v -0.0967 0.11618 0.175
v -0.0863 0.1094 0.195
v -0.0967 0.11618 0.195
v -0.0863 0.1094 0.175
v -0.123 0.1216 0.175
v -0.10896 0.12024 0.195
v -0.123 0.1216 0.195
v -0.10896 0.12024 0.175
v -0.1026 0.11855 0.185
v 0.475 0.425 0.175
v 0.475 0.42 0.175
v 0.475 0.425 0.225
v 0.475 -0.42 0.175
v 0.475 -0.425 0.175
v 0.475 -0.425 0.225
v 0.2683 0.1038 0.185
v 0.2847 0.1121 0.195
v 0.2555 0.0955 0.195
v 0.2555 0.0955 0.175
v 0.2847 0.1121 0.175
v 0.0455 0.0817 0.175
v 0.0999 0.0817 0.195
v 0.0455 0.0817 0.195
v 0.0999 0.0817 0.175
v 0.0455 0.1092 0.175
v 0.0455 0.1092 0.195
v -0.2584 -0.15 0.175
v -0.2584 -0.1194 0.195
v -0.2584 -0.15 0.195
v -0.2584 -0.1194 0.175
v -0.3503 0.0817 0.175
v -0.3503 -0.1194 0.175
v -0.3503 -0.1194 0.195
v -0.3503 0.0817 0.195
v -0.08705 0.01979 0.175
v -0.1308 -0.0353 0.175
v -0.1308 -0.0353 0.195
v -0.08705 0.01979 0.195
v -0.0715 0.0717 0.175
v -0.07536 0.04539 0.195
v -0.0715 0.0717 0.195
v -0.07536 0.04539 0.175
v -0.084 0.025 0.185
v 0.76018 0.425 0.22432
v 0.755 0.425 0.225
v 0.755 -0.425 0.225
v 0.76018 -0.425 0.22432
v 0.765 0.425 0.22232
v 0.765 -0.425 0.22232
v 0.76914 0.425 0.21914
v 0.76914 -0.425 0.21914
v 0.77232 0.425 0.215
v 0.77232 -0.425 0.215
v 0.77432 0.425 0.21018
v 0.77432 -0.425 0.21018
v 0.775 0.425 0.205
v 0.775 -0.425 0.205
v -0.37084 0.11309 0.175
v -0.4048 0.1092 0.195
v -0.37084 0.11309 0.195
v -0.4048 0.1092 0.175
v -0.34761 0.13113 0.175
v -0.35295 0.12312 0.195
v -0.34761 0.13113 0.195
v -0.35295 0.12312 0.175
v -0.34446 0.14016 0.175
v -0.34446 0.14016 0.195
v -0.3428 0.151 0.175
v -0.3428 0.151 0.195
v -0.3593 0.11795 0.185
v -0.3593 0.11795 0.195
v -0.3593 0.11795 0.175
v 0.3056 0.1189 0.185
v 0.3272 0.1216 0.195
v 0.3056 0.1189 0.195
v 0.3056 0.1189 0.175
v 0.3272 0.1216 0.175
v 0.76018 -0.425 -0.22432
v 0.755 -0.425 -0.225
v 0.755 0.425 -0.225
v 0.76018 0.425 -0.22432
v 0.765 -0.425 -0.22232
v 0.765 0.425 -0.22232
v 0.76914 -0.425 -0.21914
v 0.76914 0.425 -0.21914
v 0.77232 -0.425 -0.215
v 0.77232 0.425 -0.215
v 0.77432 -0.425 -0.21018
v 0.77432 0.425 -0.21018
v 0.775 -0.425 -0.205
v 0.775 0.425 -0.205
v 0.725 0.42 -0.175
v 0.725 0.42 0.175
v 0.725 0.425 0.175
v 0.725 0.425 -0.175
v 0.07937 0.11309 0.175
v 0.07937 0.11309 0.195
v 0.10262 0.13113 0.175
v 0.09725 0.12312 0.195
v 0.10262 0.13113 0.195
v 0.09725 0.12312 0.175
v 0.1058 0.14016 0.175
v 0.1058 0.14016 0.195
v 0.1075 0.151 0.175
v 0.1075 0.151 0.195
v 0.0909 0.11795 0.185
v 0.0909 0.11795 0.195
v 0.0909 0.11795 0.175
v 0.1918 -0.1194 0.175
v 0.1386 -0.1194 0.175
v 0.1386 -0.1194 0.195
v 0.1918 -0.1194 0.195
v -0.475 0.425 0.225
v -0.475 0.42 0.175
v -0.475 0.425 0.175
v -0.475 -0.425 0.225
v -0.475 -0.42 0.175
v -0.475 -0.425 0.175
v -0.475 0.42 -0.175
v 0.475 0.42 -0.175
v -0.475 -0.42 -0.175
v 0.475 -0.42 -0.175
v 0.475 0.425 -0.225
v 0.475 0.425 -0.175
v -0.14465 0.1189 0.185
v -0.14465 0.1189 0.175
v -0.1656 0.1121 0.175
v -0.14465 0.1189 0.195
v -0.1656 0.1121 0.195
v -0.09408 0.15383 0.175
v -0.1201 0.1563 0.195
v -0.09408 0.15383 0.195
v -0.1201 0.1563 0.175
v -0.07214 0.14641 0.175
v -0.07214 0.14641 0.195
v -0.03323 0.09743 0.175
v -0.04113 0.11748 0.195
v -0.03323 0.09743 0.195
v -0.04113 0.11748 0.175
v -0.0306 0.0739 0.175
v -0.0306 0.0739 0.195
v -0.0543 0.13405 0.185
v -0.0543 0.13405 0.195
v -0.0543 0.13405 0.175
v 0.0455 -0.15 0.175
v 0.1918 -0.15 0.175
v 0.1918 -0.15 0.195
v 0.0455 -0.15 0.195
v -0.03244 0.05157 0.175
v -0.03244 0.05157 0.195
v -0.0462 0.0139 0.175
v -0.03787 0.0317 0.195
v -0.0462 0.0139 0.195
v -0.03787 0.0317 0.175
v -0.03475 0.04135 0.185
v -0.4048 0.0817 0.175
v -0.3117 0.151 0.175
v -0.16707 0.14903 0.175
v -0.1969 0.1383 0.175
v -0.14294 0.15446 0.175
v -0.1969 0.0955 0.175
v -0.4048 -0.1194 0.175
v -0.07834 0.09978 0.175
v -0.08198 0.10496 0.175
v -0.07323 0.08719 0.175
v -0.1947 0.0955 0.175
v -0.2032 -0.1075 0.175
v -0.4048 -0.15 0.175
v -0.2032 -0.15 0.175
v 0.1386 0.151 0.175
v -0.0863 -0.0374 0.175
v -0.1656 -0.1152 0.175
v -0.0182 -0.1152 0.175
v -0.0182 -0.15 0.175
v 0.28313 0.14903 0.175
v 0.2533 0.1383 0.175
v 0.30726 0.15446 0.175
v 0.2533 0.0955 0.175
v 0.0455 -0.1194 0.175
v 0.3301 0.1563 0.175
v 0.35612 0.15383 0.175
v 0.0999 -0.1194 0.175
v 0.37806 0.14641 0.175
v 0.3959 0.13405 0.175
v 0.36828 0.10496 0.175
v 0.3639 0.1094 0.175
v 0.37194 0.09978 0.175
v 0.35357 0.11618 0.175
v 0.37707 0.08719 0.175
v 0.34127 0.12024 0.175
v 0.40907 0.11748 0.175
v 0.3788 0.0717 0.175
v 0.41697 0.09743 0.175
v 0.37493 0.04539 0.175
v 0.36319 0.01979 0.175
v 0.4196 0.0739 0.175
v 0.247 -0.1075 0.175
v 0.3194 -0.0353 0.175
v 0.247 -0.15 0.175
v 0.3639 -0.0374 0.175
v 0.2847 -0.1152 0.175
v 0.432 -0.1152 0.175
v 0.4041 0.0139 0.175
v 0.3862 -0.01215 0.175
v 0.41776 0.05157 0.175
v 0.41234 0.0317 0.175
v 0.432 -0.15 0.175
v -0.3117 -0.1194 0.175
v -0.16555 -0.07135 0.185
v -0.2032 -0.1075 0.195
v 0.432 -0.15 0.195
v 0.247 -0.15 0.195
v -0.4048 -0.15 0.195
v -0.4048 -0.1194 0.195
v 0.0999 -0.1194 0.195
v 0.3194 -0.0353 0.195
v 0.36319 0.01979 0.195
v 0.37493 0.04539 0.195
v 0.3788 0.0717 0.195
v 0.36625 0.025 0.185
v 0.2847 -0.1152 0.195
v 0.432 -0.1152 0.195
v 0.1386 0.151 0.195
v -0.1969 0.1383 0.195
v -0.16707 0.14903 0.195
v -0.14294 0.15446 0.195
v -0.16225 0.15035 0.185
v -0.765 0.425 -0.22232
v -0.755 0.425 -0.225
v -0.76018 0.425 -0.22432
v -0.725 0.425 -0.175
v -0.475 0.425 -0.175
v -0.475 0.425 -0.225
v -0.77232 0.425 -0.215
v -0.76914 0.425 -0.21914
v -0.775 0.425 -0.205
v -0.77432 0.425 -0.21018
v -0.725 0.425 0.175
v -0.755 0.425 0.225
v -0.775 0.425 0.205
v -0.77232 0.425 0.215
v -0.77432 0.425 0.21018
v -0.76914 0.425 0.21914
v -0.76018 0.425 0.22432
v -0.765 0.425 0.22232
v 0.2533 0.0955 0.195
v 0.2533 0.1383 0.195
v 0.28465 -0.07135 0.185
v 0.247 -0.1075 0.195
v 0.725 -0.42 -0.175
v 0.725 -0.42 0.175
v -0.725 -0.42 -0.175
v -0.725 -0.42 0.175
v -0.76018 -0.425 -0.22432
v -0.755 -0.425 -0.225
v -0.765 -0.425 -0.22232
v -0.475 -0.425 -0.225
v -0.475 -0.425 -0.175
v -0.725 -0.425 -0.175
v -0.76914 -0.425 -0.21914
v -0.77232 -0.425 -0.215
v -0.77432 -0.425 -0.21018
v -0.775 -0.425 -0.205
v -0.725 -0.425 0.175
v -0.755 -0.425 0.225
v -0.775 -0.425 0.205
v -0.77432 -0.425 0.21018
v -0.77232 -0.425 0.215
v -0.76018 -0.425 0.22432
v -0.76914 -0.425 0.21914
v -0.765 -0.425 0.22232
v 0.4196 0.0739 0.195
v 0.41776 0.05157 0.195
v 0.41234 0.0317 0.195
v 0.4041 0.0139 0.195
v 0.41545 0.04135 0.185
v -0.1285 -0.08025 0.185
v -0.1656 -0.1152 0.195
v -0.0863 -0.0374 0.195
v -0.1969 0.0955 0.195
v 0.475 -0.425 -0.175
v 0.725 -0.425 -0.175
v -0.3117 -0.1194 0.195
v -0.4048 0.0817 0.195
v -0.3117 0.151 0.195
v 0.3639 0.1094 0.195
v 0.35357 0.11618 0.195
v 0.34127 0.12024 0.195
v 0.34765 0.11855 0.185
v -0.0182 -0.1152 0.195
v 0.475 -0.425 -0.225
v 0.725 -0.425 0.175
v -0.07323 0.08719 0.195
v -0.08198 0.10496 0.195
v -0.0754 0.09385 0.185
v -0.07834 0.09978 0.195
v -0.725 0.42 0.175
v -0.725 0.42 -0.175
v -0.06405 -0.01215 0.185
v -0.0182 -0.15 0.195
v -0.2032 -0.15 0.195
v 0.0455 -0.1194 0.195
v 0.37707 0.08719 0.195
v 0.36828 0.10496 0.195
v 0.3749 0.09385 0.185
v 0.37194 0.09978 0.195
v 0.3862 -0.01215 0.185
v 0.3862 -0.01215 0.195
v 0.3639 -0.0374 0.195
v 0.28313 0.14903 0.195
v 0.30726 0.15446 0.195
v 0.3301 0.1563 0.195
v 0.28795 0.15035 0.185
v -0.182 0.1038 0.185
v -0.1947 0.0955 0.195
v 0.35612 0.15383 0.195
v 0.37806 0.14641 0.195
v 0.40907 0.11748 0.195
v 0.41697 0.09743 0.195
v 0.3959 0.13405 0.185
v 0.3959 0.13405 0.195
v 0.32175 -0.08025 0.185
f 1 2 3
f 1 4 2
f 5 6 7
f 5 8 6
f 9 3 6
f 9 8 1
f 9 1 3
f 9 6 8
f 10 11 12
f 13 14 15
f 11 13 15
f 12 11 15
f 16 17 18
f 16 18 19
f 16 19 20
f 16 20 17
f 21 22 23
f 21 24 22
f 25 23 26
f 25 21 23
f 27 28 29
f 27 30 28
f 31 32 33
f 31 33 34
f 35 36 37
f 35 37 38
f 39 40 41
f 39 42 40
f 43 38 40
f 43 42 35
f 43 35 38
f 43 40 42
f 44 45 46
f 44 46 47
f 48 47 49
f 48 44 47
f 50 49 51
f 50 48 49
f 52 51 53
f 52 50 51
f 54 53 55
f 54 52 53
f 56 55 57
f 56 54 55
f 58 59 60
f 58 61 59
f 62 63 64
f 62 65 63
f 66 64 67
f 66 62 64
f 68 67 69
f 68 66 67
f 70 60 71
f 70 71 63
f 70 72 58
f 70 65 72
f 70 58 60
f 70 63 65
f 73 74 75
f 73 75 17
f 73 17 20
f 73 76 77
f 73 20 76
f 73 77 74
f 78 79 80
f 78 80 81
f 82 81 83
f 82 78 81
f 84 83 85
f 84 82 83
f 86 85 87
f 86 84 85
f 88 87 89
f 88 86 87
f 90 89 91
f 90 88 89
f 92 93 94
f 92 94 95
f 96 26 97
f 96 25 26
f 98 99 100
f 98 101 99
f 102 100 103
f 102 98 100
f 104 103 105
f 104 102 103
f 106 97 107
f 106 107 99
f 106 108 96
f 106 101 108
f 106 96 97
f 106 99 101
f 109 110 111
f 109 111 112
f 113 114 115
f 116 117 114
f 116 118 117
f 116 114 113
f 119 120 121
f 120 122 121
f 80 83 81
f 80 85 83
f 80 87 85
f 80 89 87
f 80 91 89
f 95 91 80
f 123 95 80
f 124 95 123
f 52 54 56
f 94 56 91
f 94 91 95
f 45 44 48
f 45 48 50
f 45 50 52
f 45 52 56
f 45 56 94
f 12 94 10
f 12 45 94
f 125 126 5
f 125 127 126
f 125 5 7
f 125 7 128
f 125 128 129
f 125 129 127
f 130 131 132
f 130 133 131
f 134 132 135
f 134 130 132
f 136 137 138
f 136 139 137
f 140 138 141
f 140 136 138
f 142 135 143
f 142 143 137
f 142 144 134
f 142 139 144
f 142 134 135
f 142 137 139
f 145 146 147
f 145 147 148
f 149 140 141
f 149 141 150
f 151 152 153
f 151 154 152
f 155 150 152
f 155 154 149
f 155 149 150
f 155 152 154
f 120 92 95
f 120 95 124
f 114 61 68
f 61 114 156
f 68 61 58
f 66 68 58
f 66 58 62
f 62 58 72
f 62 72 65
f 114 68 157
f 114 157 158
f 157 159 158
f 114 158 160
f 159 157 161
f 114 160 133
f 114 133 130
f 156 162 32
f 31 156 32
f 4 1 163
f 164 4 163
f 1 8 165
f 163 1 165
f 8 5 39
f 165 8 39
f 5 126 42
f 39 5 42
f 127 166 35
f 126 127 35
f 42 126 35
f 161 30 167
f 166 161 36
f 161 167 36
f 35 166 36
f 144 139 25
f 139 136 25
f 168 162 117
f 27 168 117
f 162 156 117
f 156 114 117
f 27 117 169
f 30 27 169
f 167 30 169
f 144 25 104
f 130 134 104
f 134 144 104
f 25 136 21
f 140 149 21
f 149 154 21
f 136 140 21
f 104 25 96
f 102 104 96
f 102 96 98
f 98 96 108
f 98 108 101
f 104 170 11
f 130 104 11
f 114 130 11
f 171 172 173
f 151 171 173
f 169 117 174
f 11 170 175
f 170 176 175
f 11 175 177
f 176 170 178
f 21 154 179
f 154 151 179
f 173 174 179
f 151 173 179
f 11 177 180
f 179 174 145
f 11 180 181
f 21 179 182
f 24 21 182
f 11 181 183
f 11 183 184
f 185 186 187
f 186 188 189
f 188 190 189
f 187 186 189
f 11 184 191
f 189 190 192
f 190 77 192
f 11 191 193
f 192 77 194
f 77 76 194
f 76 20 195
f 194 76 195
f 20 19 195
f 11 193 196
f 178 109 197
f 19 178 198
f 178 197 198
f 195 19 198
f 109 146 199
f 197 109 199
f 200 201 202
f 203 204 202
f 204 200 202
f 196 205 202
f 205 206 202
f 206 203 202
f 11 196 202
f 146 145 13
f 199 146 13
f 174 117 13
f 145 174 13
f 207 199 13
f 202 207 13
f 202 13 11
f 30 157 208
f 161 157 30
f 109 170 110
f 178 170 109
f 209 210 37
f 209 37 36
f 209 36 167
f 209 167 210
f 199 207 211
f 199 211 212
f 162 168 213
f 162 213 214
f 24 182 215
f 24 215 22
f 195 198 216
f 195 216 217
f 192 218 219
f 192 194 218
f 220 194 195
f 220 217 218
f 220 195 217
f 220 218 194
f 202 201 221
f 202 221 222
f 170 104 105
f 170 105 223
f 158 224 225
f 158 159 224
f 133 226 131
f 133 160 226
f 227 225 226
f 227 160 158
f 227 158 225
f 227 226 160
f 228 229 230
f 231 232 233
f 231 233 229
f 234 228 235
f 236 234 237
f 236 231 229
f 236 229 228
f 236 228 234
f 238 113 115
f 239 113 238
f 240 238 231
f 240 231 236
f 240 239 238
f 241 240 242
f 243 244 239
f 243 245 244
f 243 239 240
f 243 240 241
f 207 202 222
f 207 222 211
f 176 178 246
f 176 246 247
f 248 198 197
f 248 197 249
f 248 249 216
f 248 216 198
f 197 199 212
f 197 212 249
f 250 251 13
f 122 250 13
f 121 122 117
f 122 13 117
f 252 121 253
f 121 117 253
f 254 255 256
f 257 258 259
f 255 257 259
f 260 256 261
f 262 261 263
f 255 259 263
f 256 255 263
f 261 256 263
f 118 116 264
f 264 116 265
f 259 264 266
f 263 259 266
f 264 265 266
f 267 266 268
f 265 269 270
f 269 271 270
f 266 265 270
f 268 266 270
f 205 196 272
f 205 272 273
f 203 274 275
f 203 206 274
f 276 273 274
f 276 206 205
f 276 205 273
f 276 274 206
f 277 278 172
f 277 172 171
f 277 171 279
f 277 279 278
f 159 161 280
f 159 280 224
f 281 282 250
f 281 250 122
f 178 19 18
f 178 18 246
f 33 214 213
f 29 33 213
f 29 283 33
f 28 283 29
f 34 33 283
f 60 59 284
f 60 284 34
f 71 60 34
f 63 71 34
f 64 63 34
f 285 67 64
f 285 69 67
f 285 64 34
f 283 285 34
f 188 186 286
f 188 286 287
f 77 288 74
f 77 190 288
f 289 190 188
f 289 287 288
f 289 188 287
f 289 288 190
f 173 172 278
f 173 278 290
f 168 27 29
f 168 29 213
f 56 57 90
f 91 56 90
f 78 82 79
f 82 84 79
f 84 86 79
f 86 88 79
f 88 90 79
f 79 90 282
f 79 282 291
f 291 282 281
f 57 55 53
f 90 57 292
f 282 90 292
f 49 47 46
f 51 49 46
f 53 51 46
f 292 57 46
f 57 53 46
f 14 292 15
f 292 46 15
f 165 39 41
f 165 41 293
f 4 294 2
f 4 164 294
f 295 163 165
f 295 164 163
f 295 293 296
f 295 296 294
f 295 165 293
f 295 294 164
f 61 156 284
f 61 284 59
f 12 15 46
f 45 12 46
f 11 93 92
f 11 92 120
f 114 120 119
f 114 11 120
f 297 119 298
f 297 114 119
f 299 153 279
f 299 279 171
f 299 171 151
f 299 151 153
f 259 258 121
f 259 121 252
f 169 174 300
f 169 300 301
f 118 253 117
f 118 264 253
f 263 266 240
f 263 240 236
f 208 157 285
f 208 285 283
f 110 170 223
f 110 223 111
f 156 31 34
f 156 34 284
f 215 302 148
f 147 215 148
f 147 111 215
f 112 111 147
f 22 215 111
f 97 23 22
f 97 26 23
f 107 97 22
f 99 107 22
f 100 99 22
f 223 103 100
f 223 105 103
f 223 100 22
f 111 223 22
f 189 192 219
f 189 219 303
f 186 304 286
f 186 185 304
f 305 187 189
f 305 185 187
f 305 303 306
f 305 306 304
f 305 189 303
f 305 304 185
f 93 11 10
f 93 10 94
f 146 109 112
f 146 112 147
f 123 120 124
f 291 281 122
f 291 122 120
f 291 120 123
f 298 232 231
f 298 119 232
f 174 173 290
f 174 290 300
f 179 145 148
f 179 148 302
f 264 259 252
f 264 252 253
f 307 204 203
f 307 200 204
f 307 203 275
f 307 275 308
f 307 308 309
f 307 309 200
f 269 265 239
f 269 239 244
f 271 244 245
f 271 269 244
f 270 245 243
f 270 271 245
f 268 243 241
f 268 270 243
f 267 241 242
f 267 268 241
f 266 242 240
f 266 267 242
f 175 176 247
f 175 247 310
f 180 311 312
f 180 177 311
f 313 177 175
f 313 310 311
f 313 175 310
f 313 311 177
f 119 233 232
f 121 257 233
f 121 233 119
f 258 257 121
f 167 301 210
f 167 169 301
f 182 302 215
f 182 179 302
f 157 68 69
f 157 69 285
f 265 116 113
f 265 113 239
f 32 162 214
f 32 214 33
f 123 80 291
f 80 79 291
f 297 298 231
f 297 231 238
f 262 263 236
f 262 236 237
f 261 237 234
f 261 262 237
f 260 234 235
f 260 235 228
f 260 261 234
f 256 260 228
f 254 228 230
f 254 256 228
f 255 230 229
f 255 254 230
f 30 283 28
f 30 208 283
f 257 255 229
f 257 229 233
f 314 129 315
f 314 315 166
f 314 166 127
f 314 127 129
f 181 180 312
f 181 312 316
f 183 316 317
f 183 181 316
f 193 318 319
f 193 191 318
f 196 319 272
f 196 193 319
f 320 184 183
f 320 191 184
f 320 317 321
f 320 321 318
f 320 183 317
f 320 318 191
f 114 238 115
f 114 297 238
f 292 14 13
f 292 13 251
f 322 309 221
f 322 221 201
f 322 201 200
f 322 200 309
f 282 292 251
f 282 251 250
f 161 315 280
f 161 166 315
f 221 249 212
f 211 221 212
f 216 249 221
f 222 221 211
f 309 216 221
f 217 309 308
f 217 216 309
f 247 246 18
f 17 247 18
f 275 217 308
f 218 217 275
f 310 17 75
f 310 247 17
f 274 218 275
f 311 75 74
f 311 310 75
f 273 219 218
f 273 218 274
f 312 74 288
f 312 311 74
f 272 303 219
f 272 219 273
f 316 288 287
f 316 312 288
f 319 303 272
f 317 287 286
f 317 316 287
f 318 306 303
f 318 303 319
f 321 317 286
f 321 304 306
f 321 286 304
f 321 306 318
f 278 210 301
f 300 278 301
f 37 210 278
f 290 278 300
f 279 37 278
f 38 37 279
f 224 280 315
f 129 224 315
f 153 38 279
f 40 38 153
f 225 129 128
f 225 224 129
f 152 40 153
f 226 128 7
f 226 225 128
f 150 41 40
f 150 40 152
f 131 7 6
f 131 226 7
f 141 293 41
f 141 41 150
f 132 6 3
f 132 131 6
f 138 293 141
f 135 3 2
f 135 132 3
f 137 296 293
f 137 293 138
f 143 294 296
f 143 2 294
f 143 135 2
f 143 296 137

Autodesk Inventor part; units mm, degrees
ref_plane "YZ Plane" through (0, 0, 0) normal (1, 0, 0) x (0, 1, 0)
ref_plane "XZ Plane" through (0, 0, 0) normal (0, 1, 0) x (-1, 0, 0)
ref_plane "XY Plane" through (0, 0, 0) normal (0, 0, 1) x (1, 0, 0)
sketch "Sketch1" plane through (0, 0, 0) normal (0, 1, 0) x (-1, 0, 0)
  line L0 (0.725, 0.175) -> (-0.725, 0.175)
  line L1 (-0.725, 0.175) -> (-0.725, -0.175)
  line L2 (-0.725, -0.175) -> (0.725, -0.175)
  line L3 (0.725, -0.175) -> (0.725, 0.175)
  line L4 (0.475, 0.175) -> (0.475, 0.225)
  line L5 (0.475, 0.225) -> (0.775, 0.225)
  line L6 (0.775, 0.225) -> (0.775, -0.225)
  line L7 (0.775, -0.225) -> (0.475, -0.225)
  line L8 (0.475, -0.225) -> (0.475, -0.175)
  line L9 (-0.475, 0.175) -> (-0.475, 0.225)
  line L10 (-0.475, 0.225) -> (-0.775, 0.225)
  line L11 (-0.775, 0.225) -> (-0.775, -0.225)
  line L12 (-0.775, -0.225) -> (-0.475, -0.225)
  line L13 (-0.475, -0.175) -> (-0.475, -0.225)
  line L14 (0.475, 0.175) -> (-0.475, 0.175)
  point P0 (0, 0)
  point P1 (0, 0.175)
  point P2 (0.725, 0)
  dimension "d0" = 1.55
  dimension "d1" = 0.05
  dimension "d2" = 0.05
  dimension "d3" = 0.45
  dimension "d4" = 0.3
extrude "Extrusion1" add sketch "Sketch1" along normal mid plane 0.85 contours L0 L4 L5 L6 L7 L8 L2 L3 | L0 L1 L2 L13 L12 L11 L10 L9
extrude "Extrusion2" add sketch "Sketch1" along normal mid plane 0.84 contours L3 L2 L1 L0
sketch "Sketch2" plane through (-0.475, -0.42, 0.175) normal (0, 0, 1) x (1, 0, 0)
  line L0 (0, 0) -> (0, 0.84) projected
  line L1 (0.95, 0) -> (0, 0) projected
  line L2 (0.95, 0) -> (0.95, 0.84) projected
  line L3 (0, 0.84) -> (0.95, 0.84) projected
  line L4 (0, 0.42) -> (0.95, 0.42) construction
  line L5 (0.2166, 0.27) -> (0.0702, 0.27)
  line L6 (0.0702, 0.27) -> (0.0702, 0.3006)
  line L7 (0.0702, 0.3006) -> (0.1247, 0.3006)
  line L8 (0.1247, 0.3006) -> (0.1247, 0.5017)
  line L9 (0.1247, 0.5017) -> (0.0702, 0.5017)
  line L10 (0.0702, 0.5017) -> (0.0702, 0.5292)
  spline S0 degree 2 poles (0.0702, 0.5292) (0.1011, 0.5292) (0.1303, 0.5467) (0.1322, 0.571) knots 0 0 0 1 2 2 2
  line L11 (0.1322, 0.571) -> (0.1633, 0.571)
  line L12 (0.1633, 0.571) -> (0.1633, 0.3006)
  line L13 (0.1633, 0.3006) -> (0.2166, 0.3006)
  line L14 (0.2166, 0.3006) -> (0.2166, 0.27)
  line L15 (0.4568, 0.27) -> (0.2718, 0.27)
  line L16 (0.2718, 0.27) -> (0.2718, 0.3125)
  spline S1 degree 2 poles (0.2718, 0.3125) (0.2917, 0.3313) (0.3272, 0.366) (0.3442, 0.3847) knots 0 0 0 1 2 2 2
  spline S2 degree 2 poles (0.3442, 0.3847) (0.3785, 0.4224) (0.4035, 0.4676) (0.4035, 0.4917) knots 0 0 0 1 2 2 2
  spline S3 degree 2 poles (0.4035, 0.4917) (0.4035, 0.5044) (0.3957, 0.5233) (0.3887, 0.5294) knots 0 0 0 1 2 2 2
  spline S4 degree 2 poles (0.3887, 0.5294) (0.3816, 0.5355) (0.3632, 0.5416) (0.352, 0.5416) knots 0 0 0 1 2 2 2
  spline S5 degree 2 poles (0.352, 0.5416) (0.3413, 0.5416) (0.3194, 0.5362) (0.3094, 0.5321) knots 0 0 0 1 2 2 2
  spline S6 degree 2 poles (0.3094, 0.5321) (0.3009, 0.5287) (0.2851, 0.5189) (0.2803, 0.5155) knots 0 0 0 1 2 2 2
  line L17 (0.2803, 0.5155) -> (0.2781, 0.5155)
  line L18 (0.2781, 0.5155) -> (0.2781, 0.5583)
  spline S7 degree 2 poles (0.2781, 0.5583) (0.2905, 0.5644) (0.335, 0.5763) (0.3549, 0.5763) knots 0 0 0 1 2 2 2
  spline S8 degree 2 poles (0.3549, 0.5763) (0.397, 0.5763) (0.4444, 0.5318) (0.4444, 0.4939) knots 0 0 0 1 2 2 2
  spline S9 degree 2 poles (0.4444, 0.4939) (0.4444, 0.4762) (0.4361, 0.4465) (0.4288, 0.4339) knots 0 0 0 1 2 2 2
  spline S10 degree 2 poles (0.4288, 0.4339) (0.4215, 0.4207) (0.4004, 0.395) (0.3887, 0.3826) knots 0 0 0 1 2 2 2
  spline S11 degree 2 poles (0.3887, 0.3826) (0.3697, 0.3619) (0.3233, 0.3176) (0.3094, 0.3048) knots 0 0 0 1 2 2 2
  line L19 (0.3094, 0.3048) -> (0.4568, 0.3048)
  line L20 (0.4568, 0.3048) -> (0.4568, 0.27)
  line L21 (0.6668, 0.27) -> (0.5205, 0.27)
  line L22 (0.5205, 0.27) -> (0.5205, 0.3006)
  line L23 (0.5205, 0.3006) -> (0.5749, 0.3006)
  line L24 (0.5749, 0.3006) -> (0.5749, 0.5017)
  line L25 (0.5749, 0.5017) -> (0.5205, 0.5017)
  line L26 (0.5205, 0.5017) -> (0.5205, 0.5292)
  spline S12 degree 2 poles (0.5205, 0.5292) (0.5513, 0.5292) (0.5805, 0.5467) (0.5825, 0.571) knots 0 0 0 1 2 2 2
  line L27 (0.5825, 0.571) -> (0.6136, 0.571)
  line L28 (0.6136, 0.571) -> (0.6136, 0.3006)
  line L29 (0.6136, 0.3006) -> (0.6668, 0.3006)
  line L30 (0.6668, 0.3006) -> (0.6668, 0.27)
  line L31 (0.907, 0.27) -> (0.722, 0.27)
  line L32 (0.722, 0.27) -> (0.722, 0.3125)
  spline S13 degree 2 poles (0.722, 0.3125) (0.7419, 0.3313) (0.7774, 0.366) (0.7944, 0.3847) knots 0 0 0 1 2 2 2
  spline S14 degree 2 poles (0.7944, 0.3847) (0.8287, 0.4224) (0.8538, 0.4676) (0.8538, 0.4917) knots 0 0 0 1 2 2 2
  spline S15 degree 2 poles (0.8538, 0.4917) (0.8538, 0.5044) (0.846, 0.5233) (0.8389, 0.5294) knots 0 0 0 1 2 2 2
  spline S16 degree 2 poles (0.8389, 0.5294) (0.8319, 0.5355) (0.8134, 0.5416) (0.8022, 0.5416) knots 0 0 0 1 2 2 2
  spline S17 degree 2 poles (0.8022, 0.5416) (0.7915, 0.5416) (0.7697, 0.5362) (0.7597, 0.5321) knots 0 0 0 1 2 2 2
  spline S18 degree 2 poles (0.7597, 0.5321) (0.7512, 0.5287) (0.7354, 0.5189) (0.7305, 0.5155) knots 0 0 0 1 2 2 2
  line L33 (0.7305, 0.5155) -> (0.7283, 0.5155)
  line L34 (0.7283, 0.5155) -> (0.7283, 0.5583)
  spline S19 degree 2 poles (0.7283, 0.5583) (0.7407, 0.5644) (0.7852, 0.5763) (0.8051, 0.5763) knots 0 0 0 1 2 2 2
  spline S20 degree 2 poles (0.8051, 0.5763) (0.8472, 0.5763) (0.8946, 0.5318) (0.8946, 0.4939) knots 0 0 0 1 2 2 2
  spline S21 degree 2 poles (0.8946, 0.4939) (0.8946, 0.4762) (0.8863, 0.4465) (0.8791, 0.4339) knots 0 0 0 1 2 2 2
  spline S22 degree 2 poles (0.8791, 0.4339) (0.8718, 0.4207) (0.8506, 0.395) (0.8389, 0.3826) knots 0 0 0 1 2 2 2
  spline S23 degree 2 poles (0.8389, 0.3826) (0.82, 0.3619) (0.7735, 0.3176) (0.7597, 0.3048) knots 0 0 0 1 2 2 2
  line L35 (0.7597, 0.3048) -> (0.907, 0.3048)
  line L36 (0.907, 0.3048) -> (0.907, 0.27)
  point P0 (0.475, 0.42)
extrude "Extrusion3" add sketch "Sketch2" along normal blind 0.02 contours L5 L6 L7 L8 L9 L10 S0 L11 L12 L13 L14 | L15 L16 S1 S2 S3 S4 S5 S6 L17 L18 S7 S8 S9 S10 S11 L19 L20 | L21 L22 L23 L24 L25 L26 S12 L27 L28 L29 L30 | L31 L32 S13 S14 S15 S16 S17 S18 L33 L34 S19 S20 S21 S22 S23 L35 L36
fillet "Fillet1" radius 0.02 4 edges at (-0.775, 0, 0.225) (-0.775, 0, -0.225) (0.775, 0, 0.225) (0.775, 0, -0.225)
equation "\"d2\" = d1"
properties part number "21-1001" material "Copper"
